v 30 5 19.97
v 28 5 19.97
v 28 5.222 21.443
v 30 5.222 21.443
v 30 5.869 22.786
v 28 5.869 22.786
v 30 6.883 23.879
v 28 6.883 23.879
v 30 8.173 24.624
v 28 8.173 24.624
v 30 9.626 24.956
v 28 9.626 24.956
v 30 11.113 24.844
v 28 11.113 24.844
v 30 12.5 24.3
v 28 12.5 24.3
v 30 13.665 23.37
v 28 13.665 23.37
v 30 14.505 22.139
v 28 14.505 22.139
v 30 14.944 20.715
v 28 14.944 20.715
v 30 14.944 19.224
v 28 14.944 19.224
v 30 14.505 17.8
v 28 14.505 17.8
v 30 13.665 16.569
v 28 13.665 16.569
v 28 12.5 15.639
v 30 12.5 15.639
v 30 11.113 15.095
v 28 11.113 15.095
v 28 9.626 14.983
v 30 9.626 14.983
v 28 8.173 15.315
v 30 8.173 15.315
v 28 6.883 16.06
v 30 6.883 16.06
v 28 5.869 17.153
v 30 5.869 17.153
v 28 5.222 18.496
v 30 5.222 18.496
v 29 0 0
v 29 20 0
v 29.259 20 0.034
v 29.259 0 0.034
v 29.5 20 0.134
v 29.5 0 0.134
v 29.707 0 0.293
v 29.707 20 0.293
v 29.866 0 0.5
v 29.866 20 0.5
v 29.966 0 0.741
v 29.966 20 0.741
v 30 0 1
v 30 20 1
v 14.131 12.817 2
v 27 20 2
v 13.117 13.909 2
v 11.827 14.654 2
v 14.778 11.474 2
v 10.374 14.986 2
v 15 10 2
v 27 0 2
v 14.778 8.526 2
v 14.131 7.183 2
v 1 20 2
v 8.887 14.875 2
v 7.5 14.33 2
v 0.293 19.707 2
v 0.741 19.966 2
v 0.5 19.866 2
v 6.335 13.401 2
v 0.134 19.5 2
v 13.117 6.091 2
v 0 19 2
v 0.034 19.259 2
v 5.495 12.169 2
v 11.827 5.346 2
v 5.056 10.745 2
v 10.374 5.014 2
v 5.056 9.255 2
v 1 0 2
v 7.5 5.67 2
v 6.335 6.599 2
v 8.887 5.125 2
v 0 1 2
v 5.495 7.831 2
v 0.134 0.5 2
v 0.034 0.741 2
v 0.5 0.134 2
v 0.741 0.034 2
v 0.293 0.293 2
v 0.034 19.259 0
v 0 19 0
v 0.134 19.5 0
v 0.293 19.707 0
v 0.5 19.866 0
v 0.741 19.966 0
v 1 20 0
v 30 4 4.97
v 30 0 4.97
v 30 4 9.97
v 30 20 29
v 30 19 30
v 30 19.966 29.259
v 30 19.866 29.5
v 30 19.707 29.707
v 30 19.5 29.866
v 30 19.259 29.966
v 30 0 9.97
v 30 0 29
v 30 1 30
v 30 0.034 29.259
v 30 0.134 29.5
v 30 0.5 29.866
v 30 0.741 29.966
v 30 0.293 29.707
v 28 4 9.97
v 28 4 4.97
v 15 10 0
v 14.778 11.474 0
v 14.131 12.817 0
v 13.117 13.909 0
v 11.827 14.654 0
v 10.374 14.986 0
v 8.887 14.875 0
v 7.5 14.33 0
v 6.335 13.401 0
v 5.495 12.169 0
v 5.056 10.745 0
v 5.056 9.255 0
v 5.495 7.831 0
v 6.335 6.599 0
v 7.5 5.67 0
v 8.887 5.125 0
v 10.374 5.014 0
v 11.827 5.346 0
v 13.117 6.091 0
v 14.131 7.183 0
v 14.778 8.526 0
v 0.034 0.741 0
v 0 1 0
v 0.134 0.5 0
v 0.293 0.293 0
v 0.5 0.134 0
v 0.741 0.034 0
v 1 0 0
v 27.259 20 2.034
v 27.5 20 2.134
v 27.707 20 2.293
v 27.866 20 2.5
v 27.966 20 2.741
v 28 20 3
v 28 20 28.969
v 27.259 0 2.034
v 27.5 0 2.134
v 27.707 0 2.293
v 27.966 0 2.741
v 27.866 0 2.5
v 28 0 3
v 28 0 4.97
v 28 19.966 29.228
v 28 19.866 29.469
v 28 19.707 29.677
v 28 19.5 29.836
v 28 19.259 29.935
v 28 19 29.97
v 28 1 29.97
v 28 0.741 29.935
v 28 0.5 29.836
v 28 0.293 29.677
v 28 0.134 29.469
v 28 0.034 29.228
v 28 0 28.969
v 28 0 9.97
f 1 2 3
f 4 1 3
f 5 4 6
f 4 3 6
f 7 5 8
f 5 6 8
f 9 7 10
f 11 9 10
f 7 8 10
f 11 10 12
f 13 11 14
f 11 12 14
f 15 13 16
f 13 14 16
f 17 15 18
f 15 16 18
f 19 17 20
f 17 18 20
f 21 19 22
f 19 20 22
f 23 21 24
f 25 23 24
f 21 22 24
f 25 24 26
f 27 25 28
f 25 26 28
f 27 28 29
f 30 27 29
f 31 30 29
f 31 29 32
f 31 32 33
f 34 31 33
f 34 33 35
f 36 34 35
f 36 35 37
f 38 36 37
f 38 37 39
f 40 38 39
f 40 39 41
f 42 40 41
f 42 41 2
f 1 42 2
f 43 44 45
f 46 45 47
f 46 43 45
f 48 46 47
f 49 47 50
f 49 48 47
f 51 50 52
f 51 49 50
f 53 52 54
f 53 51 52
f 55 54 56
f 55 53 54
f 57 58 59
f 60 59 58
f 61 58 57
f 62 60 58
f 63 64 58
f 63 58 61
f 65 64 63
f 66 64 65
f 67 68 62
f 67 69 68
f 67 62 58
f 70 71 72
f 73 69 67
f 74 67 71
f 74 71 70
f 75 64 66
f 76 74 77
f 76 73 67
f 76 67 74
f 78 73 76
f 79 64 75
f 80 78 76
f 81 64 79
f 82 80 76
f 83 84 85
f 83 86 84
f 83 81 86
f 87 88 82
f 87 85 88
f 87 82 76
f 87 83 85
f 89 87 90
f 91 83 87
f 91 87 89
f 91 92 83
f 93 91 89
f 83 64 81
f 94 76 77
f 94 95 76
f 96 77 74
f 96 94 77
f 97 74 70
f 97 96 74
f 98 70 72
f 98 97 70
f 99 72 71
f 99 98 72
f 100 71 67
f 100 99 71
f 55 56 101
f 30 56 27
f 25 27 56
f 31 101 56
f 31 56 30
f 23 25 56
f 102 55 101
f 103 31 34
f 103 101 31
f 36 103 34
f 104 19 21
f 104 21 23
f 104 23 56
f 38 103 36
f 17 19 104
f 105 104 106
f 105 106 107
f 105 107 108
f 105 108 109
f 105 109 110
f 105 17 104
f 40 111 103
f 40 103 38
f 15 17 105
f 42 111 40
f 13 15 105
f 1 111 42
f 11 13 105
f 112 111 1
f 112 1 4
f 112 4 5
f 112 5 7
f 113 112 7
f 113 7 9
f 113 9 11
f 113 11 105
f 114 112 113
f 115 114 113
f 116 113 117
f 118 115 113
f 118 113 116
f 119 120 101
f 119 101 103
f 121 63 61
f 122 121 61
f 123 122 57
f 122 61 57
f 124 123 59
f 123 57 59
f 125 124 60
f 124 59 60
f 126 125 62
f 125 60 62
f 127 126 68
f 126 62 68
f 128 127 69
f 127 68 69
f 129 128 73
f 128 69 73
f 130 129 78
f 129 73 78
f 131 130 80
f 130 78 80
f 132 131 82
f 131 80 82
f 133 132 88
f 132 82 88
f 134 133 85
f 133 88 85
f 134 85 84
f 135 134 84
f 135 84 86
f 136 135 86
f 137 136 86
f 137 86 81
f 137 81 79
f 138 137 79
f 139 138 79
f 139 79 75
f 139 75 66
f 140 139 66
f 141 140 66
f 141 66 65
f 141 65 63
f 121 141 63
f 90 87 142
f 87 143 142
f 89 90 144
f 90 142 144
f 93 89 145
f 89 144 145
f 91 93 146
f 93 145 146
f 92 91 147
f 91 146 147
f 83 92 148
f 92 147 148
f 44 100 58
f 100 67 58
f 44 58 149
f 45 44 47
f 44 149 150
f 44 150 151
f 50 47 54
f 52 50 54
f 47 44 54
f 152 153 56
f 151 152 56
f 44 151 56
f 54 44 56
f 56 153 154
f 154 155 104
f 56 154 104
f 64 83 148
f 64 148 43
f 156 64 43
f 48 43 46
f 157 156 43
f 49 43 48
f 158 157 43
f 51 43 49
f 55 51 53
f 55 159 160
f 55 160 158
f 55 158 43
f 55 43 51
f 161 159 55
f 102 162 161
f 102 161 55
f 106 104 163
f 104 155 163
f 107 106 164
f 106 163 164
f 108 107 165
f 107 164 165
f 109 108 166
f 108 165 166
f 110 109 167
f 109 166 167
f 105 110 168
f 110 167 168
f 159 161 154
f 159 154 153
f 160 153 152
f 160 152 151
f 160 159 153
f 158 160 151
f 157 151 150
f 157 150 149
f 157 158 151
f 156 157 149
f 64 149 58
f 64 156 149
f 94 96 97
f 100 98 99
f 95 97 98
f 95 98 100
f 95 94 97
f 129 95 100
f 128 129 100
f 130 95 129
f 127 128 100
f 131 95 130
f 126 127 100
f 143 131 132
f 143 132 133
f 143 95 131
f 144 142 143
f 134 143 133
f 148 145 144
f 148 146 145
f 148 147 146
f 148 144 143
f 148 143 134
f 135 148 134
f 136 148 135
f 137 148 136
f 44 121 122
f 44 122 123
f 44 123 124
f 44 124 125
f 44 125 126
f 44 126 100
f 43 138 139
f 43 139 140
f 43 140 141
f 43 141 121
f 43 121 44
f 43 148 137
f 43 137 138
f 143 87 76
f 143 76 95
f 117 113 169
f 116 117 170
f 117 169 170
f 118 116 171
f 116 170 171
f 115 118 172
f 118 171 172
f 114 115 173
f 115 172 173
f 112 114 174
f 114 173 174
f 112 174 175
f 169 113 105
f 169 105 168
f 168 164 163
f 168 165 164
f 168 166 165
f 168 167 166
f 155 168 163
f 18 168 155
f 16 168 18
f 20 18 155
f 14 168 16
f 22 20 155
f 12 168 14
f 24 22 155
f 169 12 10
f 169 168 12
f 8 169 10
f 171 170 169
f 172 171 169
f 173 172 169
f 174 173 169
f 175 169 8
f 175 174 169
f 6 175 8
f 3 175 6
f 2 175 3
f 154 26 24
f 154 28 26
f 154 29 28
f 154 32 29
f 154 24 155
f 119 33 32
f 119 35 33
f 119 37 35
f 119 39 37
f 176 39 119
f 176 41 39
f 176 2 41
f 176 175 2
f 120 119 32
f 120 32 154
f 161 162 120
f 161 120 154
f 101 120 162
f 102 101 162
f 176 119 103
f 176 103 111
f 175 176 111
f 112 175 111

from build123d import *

# Parameters (mm, degrees)
F1_DEPTH = 20
F2_R     = 5
F3_DEPTH = 2.001
F4_R     = 5
F5_DEPTH = 2.000768
F6_W     = 4
F6_H     = 5
F7_DEPTH = 2.000768
F8_R     = 1


with BuildPart() as f1:
    # F0 (on Front) → F1 (new body)
    with BuildSketch(Plane.XZ):
        with BuildLine():
            Line((0, 2), (0, 0))
            Line((0, 0), (29, 0))
            ThreePointArc((29, 0), (29.707107, 0.292893), (30, 1))
            Line((30, 1), (30, 30))
            Line((30, 30), (28.000232, 29.969506))
            Line((28.000232, 29.969506), (28.000232, 3))
            ThreePointArc((28.000232, 3), (27.707339, 2.292893), (27.000232, 2))
            Line((27.000232, 2), (0, 2))
        make_face()
    extrude(amount=-F1_DEPTH)

    # F2 (on face) → F3 (cut, through all)
    with BuildSketch(Plane.XY.offset(2)):
        with Locations((10, 10)):
            Circle(F2_R)
    extrude(amount=-F3_DEPTH, mode=Mode.SUBTRACT)

    # F4 (on face) → F5 (cut, through all)
    with BuildSketch(Plane(origin=(28.000232, 0, 0), x_dir=(0, -1, 0), z_dir=(-1, 0, 0))):
        with Locations((-10, 19.969506)):
            Circle(F4_R)
    extrude(amount=-F5_DEPTH, mode=Mode.SUBTRACT)

    # F6 (on face) → F7 (cut, through all)
    with BuildSketch(Plane(origin=(28.000232, 0, 0), x_dir=(0, -1, 0), z_dir=(-1, 0, 0))):
        with Locations((-2, 7.469506)):
            Rectangle(F6_W, F6_H)
    extrude(amount=-F7_DEPTH, mode=Mode.SUBTRACT)

    # F8
    f8_edges = [f1.edges().sort_by_distance(p)[0] for p in [
        (0, 0, 1),
        (29.000116, 0, 29.984753),
        (0, 20, 1),
        (29.000116, 20, 29.984753),
    ]]
    fillet(f8_edges, radius=F8_R)


solid = f1.part
